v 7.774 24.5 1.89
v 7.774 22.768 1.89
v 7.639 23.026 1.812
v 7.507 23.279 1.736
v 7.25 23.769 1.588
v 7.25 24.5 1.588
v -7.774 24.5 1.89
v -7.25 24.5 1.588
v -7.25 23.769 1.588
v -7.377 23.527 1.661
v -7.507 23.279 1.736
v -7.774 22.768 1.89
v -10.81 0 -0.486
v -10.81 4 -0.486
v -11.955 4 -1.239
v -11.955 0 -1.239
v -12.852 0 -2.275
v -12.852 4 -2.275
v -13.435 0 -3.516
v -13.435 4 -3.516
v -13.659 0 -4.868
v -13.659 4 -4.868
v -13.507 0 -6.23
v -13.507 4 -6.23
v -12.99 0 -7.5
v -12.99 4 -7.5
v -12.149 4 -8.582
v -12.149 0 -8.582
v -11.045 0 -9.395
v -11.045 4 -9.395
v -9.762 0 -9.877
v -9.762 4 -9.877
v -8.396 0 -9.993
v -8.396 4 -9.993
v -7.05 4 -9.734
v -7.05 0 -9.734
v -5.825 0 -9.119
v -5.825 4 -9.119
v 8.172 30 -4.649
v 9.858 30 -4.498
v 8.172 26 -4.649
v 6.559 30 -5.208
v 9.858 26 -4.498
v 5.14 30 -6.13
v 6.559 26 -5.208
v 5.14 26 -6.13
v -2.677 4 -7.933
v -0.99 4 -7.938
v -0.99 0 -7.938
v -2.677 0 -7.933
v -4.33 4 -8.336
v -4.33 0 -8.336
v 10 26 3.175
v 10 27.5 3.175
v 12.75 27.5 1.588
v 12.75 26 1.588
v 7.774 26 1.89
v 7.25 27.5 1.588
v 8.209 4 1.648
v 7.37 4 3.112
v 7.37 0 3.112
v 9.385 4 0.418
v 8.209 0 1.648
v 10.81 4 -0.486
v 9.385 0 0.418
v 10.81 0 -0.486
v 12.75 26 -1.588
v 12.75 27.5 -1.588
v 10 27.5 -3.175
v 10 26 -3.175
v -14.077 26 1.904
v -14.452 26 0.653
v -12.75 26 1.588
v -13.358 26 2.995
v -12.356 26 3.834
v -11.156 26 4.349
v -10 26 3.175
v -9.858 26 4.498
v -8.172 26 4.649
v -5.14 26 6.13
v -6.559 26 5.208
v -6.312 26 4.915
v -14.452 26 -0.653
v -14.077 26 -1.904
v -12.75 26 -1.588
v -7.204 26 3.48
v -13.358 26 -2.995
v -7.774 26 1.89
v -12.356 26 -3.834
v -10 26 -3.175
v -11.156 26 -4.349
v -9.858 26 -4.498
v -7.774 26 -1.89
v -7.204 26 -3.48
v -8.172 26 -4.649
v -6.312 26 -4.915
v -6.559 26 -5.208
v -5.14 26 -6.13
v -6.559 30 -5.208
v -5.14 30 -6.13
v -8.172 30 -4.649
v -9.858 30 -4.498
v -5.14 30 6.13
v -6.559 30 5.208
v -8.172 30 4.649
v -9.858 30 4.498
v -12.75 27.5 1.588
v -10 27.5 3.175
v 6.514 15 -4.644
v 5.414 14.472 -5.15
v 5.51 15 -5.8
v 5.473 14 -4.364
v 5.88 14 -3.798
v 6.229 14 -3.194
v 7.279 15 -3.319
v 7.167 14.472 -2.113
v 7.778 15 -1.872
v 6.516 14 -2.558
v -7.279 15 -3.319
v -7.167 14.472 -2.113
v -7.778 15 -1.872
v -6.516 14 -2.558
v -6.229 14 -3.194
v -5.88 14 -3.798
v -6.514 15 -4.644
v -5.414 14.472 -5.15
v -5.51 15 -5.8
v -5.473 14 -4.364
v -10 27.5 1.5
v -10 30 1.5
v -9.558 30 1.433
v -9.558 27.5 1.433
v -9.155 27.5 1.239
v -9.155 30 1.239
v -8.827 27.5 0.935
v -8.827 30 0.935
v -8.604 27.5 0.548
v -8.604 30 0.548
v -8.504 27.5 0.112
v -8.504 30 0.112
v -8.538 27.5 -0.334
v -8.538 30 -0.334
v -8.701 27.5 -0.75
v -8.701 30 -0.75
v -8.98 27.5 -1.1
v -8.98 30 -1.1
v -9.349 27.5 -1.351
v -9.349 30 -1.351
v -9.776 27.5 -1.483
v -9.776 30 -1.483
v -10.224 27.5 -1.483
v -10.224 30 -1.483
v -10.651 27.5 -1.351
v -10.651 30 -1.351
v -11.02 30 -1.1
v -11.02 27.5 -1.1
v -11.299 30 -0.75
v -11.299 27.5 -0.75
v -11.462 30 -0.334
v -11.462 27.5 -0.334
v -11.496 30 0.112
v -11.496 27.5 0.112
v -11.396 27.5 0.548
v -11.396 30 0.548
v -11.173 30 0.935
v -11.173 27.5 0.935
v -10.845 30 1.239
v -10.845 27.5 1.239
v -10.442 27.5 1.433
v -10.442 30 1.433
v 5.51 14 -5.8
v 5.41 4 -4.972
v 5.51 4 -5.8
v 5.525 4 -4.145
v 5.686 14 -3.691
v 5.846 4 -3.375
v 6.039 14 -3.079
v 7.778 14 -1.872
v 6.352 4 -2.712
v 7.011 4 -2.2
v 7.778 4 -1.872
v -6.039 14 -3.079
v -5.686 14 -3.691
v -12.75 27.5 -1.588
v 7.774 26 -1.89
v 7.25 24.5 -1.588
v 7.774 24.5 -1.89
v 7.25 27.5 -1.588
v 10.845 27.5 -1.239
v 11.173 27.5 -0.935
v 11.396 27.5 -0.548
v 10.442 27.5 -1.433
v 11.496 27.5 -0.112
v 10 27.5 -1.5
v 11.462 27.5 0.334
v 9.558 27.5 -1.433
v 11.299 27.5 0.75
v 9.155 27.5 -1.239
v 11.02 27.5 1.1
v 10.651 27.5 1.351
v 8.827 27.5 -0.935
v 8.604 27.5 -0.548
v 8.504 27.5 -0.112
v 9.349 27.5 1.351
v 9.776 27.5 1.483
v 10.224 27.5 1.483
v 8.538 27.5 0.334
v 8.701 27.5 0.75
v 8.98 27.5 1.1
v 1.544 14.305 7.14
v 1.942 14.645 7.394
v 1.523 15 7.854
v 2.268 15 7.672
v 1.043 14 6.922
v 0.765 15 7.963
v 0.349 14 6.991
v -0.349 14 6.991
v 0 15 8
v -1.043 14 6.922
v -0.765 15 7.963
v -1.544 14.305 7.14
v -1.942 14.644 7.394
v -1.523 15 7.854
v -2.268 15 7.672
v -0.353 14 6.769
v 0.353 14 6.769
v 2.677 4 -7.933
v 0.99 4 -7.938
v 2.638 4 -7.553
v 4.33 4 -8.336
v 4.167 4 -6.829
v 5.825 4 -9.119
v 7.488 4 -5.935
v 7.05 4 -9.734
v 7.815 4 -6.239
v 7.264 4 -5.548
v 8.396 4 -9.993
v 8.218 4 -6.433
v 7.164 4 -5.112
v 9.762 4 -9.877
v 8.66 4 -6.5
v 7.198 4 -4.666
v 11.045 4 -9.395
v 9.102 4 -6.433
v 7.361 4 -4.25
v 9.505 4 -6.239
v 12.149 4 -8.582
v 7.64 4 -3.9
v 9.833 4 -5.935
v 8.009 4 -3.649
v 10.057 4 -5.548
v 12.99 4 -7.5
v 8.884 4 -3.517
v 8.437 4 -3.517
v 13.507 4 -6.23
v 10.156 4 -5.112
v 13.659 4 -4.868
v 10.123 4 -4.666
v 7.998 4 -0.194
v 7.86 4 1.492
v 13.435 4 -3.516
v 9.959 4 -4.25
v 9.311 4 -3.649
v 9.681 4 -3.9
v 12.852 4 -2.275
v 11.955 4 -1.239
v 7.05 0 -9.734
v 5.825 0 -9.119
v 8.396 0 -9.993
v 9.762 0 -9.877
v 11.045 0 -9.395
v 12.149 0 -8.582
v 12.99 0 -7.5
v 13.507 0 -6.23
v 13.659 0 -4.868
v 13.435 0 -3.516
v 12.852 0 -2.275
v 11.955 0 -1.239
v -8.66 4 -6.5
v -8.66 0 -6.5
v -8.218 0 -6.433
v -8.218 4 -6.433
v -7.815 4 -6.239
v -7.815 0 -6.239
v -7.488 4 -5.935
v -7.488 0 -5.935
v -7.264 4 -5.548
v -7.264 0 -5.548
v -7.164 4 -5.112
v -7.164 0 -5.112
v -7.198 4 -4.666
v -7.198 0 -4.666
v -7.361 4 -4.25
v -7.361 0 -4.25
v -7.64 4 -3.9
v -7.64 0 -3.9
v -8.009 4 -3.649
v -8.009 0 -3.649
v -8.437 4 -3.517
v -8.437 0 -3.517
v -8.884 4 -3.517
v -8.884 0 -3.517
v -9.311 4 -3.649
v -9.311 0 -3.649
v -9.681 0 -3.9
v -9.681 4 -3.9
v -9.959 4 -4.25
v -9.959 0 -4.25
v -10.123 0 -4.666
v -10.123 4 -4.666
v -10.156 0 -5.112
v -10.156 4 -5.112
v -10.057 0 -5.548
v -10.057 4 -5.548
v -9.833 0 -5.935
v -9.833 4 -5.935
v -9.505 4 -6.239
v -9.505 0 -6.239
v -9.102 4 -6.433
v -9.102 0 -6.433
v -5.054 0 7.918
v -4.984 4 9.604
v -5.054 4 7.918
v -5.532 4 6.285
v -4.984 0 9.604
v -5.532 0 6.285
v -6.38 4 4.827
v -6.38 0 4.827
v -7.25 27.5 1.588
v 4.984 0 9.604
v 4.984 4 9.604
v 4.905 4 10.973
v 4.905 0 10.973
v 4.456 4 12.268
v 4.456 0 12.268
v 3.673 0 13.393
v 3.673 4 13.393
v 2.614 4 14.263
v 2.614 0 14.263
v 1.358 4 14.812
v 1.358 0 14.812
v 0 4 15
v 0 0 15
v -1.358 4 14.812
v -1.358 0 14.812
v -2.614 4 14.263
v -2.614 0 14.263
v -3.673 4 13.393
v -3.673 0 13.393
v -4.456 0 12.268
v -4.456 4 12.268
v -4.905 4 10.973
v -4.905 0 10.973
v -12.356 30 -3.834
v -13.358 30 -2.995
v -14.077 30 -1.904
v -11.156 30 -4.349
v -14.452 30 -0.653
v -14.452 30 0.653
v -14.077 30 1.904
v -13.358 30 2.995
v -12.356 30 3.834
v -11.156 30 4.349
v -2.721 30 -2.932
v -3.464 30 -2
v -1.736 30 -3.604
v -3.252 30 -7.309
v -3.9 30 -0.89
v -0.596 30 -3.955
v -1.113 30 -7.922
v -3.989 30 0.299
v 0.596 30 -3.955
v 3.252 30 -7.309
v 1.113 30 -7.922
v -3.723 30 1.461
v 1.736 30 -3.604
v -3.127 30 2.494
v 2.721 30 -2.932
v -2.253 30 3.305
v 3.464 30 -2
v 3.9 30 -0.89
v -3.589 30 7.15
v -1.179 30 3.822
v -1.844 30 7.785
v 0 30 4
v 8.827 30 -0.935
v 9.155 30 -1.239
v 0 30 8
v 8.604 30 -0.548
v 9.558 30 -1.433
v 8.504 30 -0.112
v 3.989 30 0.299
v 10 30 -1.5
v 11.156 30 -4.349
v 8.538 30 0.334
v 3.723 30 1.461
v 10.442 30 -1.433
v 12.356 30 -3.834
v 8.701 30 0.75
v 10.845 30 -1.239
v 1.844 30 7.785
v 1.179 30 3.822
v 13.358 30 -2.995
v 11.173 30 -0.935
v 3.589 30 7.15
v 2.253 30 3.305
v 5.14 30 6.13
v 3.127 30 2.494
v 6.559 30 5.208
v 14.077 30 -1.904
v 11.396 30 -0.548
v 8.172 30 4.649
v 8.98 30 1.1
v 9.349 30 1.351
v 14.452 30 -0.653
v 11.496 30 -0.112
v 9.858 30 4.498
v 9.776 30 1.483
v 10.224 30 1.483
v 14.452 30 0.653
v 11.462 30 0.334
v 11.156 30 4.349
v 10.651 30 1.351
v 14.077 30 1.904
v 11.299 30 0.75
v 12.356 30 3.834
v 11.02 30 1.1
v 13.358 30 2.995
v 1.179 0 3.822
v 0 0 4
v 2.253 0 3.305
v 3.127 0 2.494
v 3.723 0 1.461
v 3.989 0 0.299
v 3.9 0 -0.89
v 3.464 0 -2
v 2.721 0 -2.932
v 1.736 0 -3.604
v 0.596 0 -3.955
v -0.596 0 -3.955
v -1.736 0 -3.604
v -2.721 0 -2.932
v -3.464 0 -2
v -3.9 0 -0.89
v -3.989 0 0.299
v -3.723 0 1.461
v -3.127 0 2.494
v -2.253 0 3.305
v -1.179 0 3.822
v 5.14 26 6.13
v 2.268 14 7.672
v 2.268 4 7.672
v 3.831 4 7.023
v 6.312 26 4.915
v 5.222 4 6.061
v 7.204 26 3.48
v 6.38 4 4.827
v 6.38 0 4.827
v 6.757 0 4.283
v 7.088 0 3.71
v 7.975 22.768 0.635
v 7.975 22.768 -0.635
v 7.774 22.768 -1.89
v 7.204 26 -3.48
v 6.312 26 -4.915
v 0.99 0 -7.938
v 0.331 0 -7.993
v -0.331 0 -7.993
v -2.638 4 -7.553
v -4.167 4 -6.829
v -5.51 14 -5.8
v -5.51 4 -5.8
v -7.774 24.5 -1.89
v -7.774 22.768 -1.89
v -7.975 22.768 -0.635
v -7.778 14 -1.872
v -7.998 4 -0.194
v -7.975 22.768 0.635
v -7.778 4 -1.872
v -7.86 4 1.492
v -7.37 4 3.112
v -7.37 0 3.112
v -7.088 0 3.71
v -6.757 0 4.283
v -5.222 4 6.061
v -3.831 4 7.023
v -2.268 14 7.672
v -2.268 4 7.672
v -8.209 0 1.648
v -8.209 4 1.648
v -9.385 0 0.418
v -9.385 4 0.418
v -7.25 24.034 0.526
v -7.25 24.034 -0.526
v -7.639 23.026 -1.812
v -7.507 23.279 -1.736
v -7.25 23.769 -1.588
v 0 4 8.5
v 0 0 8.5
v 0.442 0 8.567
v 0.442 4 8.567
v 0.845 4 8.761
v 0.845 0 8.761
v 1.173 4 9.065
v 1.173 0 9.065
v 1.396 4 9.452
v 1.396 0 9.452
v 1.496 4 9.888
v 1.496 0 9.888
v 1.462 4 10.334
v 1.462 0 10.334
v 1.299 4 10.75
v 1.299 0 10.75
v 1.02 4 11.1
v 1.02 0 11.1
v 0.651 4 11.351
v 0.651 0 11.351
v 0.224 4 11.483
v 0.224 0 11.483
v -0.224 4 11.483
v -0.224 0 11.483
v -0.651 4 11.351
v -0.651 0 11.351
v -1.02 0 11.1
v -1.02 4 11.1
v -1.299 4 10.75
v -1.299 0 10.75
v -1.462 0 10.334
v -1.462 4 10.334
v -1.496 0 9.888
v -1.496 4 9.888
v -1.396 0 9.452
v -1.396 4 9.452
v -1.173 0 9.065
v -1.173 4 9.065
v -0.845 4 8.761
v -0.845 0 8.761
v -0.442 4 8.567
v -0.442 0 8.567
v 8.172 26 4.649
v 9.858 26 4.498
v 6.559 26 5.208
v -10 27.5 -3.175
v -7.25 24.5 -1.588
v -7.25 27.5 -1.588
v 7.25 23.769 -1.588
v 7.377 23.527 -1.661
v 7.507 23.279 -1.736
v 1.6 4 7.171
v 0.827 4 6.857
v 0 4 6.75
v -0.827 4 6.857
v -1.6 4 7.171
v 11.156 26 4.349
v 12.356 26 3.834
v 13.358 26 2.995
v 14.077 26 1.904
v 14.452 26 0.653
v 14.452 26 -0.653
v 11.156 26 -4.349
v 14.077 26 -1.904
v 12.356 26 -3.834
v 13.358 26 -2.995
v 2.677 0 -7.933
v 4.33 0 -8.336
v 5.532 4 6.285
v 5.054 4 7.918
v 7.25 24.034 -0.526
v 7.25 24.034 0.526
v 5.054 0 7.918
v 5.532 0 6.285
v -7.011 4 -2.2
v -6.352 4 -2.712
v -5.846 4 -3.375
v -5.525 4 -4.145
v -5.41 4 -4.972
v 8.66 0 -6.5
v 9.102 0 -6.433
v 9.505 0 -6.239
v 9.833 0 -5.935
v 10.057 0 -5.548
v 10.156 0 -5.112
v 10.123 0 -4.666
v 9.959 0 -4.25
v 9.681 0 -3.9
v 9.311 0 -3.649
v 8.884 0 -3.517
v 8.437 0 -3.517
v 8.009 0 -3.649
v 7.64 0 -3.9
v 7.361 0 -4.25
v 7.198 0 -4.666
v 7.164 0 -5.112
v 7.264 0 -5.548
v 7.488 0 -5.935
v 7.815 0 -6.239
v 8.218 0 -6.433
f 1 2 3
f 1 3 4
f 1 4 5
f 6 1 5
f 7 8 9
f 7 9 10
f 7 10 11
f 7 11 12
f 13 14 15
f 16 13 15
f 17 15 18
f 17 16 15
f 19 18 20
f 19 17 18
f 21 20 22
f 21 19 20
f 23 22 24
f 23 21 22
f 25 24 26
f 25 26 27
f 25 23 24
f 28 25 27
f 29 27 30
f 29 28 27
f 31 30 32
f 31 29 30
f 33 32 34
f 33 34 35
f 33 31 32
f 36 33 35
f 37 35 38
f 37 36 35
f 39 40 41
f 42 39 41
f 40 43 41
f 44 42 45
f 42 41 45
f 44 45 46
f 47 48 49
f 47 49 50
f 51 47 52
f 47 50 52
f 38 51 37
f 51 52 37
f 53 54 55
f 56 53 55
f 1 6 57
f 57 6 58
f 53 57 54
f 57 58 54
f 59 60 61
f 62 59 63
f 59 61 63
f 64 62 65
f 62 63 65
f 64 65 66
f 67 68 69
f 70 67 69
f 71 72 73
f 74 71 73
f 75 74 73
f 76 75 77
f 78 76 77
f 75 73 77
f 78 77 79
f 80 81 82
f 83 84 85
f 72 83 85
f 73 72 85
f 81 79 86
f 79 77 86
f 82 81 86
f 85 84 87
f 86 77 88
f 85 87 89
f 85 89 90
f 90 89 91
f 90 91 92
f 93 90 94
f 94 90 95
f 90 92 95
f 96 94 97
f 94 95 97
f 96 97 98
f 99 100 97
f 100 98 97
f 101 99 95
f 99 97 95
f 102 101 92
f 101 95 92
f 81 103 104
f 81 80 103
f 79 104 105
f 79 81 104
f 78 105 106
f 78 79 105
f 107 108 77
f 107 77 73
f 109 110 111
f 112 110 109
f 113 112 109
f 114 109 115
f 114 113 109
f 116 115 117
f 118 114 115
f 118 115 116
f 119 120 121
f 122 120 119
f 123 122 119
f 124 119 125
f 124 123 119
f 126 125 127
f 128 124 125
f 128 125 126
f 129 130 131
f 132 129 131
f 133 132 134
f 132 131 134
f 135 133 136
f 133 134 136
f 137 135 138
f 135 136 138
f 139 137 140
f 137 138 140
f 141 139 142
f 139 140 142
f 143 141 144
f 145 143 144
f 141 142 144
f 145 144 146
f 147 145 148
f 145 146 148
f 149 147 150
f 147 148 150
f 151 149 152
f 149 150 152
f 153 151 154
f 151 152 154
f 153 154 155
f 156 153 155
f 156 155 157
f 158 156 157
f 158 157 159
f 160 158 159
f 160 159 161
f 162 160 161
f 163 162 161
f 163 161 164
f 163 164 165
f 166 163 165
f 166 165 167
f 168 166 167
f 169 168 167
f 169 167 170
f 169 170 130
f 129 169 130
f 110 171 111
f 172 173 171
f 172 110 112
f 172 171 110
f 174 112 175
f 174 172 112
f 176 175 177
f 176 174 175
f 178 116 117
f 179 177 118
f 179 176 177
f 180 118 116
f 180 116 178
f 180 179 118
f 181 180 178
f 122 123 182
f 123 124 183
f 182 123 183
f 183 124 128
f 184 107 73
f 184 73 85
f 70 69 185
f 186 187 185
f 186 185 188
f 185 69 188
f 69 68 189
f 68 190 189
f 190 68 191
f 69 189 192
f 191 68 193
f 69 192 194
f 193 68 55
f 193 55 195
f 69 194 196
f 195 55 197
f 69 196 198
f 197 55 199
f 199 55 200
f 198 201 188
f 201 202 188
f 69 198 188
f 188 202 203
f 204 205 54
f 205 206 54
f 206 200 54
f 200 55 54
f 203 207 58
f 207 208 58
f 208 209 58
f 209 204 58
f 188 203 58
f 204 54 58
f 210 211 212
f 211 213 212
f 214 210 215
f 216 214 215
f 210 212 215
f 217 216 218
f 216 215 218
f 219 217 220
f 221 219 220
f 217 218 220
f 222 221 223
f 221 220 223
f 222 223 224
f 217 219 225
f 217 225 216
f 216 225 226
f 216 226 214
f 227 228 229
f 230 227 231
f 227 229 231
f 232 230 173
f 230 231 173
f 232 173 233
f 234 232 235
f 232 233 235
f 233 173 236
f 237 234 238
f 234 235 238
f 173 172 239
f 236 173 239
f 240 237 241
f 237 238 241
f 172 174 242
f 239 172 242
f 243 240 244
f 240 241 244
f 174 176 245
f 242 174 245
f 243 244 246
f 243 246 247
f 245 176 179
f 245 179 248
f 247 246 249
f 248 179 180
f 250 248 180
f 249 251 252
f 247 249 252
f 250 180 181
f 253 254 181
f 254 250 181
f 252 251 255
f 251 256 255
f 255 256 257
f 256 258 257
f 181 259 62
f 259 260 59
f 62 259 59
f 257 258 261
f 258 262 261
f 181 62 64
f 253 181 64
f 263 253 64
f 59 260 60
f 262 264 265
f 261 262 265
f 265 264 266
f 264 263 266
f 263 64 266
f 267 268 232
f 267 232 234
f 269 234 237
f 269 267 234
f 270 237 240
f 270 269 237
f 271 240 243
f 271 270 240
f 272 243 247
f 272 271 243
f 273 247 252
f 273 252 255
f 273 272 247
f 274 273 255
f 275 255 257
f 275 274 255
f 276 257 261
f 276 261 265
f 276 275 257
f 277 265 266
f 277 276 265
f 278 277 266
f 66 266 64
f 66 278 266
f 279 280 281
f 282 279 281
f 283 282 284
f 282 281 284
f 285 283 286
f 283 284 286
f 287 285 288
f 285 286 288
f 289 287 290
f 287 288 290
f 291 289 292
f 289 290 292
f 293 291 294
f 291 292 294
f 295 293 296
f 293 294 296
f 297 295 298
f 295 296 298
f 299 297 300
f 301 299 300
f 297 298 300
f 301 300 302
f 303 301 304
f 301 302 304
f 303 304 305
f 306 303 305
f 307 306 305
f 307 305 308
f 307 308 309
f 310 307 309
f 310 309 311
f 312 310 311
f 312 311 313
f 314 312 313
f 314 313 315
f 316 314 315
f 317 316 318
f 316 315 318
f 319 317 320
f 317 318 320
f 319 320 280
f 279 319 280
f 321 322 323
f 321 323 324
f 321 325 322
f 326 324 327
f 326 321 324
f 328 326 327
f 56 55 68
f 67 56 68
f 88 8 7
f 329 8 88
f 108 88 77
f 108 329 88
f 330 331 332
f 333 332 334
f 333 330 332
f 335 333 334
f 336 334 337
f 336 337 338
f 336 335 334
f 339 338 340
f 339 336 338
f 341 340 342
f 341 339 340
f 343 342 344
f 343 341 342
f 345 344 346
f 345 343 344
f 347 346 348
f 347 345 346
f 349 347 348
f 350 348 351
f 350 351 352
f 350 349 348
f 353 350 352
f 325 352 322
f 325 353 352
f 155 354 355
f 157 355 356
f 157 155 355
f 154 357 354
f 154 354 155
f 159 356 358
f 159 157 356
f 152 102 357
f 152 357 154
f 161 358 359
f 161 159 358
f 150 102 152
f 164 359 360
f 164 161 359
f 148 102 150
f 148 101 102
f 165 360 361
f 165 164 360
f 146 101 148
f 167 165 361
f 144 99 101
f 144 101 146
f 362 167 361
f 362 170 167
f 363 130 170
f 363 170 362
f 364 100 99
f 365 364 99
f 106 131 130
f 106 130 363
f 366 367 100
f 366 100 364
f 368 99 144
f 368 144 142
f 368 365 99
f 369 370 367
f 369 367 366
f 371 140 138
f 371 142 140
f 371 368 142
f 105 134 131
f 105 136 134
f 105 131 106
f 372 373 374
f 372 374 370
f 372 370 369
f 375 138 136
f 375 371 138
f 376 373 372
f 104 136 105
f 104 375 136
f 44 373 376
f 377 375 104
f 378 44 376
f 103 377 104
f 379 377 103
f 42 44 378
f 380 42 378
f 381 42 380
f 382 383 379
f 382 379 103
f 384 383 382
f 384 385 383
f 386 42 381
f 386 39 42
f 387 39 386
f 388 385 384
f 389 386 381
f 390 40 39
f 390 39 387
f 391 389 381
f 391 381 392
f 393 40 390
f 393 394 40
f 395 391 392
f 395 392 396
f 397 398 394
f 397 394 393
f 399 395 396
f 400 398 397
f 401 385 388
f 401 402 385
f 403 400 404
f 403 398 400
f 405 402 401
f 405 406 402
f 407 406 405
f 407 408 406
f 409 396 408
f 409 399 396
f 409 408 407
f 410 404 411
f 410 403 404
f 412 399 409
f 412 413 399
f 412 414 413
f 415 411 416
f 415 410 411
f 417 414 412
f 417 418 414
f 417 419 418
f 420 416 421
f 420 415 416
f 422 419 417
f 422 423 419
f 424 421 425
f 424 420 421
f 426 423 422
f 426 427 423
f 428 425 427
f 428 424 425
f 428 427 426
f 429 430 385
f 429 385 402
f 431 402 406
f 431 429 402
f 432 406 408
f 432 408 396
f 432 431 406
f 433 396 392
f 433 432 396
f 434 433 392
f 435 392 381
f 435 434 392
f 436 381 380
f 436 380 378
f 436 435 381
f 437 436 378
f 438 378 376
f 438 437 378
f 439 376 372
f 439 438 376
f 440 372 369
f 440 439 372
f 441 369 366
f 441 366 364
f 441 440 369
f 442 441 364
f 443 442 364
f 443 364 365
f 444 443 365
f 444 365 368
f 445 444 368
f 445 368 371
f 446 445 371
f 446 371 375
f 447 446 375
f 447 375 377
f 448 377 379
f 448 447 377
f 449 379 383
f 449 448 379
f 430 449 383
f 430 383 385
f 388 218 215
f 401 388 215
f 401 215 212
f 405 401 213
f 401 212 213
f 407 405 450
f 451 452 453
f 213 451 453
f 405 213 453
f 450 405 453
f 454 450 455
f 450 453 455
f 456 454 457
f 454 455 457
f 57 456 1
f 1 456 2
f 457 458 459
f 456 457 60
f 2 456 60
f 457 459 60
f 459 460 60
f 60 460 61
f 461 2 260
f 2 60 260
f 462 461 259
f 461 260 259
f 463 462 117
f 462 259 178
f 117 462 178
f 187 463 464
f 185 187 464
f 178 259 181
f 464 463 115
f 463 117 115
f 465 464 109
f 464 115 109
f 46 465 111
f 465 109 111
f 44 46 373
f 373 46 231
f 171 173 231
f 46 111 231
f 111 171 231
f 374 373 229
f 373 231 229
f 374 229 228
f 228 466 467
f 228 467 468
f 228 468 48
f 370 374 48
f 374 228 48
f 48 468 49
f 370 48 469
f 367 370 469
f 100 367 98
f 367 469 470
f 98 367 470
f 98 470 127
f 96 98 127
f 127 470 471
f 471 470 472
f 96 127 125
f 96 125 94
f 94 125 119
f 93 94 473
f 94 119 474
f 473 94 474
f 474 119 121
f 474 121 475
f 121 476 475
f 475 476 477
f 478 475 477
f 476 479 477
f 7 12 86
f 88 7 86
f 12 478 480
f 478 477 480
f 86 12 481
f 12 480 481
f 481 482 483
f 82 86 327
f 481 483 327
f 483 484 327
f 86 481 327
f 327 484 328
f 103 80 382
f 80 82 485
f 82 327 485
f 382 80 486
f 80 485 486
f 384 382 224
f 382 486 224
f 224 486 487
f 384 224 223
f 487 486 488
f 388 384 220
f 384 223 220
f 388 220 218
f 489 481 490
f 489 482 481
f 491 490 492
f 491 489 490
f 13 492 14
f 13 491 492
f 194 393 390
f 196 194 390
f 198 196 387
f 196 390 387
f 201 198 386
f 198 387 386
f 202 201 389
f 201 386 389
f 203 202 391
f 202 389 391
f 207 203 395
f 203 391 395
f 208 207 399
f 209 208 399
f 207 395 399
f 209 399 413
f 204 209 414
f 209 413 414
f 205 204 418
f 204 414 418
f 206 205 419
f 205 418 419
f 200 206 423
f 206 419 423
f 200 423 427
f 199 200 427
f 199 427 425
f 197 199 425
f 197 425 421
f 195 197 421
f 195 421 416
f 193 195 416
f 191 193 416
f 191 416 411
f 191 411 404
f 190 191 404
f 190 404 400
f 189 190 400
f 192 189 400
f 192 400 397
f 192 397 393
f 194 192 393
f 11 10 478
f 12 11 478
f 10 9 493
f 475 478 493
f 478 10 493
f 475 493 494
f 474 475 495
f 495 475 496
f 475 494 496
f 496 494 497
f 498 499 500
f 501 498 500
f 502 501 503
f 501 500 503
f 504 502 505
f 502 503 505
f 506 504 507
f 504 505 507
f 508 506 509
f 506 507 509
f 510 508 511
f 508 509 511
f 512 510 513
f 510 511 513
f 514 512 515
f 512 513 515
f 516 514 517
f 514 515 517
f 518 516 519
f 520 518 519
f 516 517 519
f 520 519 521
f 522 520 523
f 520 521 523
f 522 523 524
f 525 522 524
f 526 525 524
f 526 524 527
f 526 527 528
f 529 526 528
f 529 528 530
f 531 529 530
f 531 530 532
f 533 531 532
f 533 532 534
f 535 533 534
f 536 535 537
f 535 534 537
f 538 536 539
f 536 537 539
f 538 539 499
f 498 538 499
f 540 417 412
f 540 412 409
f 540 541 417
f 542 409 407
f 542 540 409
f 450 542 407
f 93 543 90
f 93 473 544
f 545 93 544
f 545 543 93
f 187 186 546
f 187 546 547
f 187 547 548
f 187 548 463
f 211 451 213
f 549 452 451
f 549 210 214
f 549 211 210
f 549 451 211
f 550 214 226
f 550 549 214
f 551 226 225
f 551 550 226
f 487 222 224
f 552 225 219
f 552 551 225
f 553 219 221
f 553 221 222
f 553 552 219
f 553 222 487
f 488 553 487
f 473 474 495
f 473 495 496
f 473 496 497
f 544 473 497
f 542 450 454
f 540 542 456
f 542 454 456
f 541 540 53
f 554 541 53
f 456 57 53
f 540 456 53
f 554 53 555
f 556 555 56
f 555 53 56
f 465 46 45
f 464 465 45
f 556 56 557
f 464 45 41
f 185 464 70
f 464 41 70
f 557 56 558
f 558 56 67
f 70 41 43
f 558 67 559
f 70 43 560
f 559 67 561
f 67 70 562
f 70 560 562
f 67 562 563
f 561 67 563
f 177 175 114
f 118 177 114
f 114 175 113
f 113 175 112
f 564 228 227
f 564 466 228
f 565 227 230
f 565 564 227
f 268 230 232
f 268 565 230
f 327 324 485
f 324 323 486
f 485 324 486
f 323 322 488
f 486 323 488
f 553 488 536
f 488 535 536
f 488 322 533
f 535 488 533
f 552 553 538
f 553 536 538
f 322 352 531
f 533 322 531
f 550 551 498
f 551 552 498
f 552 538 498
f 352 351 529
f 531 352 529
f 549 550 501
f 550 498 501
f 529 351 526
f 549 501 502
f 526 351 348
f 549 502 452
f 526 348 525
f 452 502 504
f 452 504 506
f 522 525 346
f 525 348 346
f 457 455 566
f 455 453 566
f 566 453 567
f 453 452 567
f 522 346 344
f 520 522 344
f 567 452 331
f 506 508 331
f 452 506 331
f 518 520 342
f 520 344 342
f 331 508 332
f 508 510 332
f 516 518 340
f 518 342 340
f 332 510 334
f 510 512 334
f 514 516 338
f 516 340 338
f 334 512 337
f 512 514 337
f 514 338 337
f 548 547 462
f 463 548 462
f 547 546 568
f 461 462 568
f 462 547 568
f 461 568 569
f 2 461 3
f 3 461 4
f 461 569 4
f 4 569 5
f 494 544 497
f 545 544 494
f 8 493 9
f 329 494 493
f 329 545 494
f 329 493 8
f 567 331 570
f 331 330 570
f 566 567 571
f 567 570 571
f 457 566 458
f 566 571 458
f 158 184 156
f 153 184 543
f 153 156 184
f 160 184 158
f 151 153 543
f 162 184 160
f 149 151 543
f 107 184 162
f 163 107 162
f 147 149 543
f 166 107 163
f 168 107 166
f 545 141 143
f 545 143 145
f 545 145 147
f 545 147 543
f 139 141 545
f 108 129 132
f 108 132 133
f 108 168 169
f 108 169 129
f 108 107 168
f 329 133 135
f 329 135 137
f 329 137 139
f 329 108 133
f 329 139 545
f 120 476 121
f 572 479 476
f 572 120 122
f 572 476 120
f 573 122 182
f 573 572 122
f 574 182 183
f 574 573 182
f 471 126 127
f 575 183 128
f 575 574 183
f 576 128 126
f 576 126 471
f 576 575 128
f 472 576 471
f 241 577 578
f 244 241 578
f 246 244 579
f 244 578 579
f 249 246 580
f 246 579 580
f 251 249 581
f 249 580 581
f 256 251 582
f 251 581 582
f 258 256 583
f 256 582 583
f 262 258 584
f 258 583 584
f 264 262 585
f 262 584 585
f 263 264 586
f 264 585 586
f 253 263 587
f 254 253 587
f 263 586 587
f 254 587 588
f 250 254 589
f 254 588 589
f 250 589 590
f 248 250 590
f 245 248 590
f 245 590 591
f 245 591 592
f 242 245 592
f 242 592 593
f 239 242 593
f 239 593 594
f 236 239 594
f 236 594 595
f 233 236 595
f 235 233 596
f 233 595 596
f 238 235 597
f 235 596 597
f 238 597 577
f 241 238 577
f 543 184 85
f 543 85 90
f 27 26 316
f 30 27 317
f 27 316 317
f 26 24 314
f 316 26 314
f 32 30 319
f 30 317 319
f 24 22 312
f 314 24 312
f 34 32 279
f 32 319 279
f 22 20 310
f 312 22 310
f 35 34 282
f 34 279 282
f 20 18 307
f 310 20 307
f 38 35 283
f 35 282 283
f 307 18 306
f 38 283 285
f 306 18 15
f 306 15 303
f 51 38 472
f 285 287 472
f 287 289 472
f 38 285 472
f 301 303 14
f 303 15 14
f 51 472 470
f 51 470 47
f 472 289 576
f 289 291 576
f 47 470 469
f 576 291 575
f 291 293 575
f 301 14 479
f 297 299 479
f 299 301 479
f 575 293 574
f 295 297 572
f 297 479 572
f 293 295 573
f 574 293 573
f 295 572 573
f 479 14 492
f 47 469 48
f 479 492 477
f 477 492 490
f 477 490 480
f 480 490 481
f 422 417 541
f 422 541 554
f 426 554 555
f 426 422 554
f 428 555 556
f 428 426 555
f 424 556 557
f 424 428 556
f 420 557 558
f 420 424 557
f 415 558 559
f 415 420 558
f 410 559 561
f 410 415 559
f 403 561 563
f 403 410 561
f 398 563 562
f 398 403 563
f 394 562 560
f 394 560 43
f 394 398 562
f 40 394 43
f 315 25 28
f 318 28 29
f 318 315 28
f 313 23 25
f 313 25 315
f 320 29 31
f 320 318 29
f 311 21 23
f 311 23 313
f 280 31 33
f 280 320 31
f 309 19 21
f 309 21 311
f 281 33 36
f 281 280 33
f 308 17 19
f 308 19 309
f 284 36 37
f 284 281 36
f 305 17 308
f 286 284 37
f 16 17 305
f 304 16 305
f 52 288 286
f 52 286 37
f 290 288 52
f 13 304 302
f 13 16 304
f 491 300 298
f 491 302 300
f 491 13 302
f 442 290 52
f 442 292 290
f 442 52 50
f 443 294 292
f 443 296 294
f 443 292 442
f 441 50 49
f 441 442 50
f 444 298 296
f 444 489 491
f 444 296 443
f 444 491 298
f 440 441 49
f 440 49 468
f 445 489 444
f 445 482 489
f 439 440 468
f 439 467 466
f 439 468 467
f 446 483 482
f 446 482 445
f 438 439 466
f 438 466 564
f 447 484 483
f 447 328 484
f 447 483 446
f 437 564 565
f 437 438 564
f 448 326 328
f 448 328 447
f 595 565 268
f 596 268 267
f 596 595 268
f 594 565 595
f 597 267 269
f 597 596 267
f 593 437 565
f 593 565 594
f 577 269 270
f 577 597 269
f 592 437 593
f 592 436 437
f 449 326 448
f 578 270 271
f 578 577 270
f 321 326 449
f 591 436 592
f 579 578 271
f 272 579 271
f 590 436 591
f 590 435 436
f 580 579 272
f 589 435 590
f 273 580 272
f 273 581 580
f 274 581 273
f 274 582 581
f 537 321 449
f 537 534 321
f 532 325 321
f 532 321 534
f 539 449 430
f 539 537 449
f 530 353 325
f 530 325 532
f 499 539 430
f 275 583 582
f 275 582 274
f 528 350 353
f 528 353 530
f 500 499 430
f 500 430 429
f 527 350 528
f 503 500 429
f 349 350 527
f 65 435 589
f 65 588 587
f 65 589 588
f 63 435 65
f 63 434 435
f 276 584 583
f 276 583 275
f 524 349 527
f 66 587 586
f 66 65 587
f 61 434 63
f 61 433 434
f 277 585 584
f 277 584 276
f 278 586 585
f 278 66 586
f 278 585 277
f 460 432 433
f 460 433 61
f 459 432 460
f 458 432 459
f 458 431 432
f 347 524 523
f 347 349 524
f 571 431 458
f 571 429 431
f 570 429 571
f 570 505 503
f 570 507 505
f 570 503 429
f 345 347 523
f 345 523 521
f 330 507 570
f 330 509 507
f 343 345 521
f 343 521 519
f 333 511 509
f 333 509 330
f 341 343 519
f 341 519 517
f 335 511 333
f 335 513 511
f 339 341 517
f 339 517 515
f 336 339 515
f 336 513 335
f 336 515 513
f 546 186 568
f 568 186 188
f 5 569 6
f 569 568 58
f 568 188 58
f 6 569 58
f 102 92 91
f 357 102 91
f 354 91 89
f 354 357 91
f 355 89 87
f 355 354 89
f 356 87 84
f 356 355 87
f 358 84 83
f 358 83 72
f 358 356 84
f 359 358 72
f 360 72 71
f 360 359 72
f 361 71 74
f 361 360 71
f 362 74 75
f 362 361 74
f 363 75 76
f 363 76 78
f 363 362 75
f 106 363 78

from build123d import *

# Parameters (mm, degrees)
SKETCH1_R               = 8
SKETCH1_R_2             = 4
BOSS_EXTRUDE1_DEPTH     = 30
SKETCH2_R               = 4.5
SKETCH2_R_2             = 1.5
BOSS_EXTRUDE2_DEPTH     = 4
FILLET1_R               = 7
SKETCH3_R               = 5
SKETCH3_R_2             = 1.5
BOSS_EXTRUDE3_DEPTH     = 4
FILLET2_R               = 7
SKETCH4_R               = 3.25
CUT_EXTRUDE1_DEPTH      = 10
CHAMFER1_SIZE           = 1
CUT_EXTRUDE2_DEPTH      = 1.5
CUT_EXTRUDE2_DEPTH_BACK = 1.5
CHAMFER2_SIZE           = 1.732050808
CHAMFER2_SIZE_2         = 1
CHAMFER3_SIZE           = 1.732050808
CHAMFER3_SIZE_2         = 1


with BuildPart() as part:
    # Sketch1 → Boss-Extrude1 (new body)
    with BuildSketch(Plane(origin=(0, 0, 0), x_dir=(1, 0, 0), z_dir=(0, 1, 0))):
        with Locations(Location((0, 0, 0), (0, 0, 270))):
            Circle(SKETCH1_R)
        with Locations(Location((0, 0, 0), (0, 0, 270))):
            Circle(SKETCH1_R_2, mode=Mode.SUBTRACT)
    extrude(amount=BOSS_EXTRUDE1_DEPTH)

    # Sketch2 → Boss-Extrude2 (add)
    # profile 1 of 2: a face of its own
    with BuildSketch(Plane(origin=(0, 30, 0), x_dir=(1, 0, 0), z_dir=(0, 1, 0))):
        with Locations((-10, 0)):
            Circle(SKETCH2_R)
        with Locations(Location((-10, 0, 0), (0, 0, 270))):
            Circle(SKETCH2_R_2, mode=Mode.SUBTRACT)
    # profile 2 of 2: a face of its own
    with BuildSketch(Plane(origin=(0, 30, 0), x_dir=(1, 0, 0), z_dir=(0, 1, 0))):
        with Locations((10, 0)):
            Circle(SKETCH2_R)
        with Locations(Location((10, 0, 0), (0, 0, 90))):
            Circle(SKETCH2_R_2, mode=Mode.SUBTRACT)
    extrude(amount=-BOSS_EXTRUDE2_DEPTH)

    # Fillet1
    fillet1_edges = [part.edges().sort_by_distance(p)[0] for p in [
        (-7.1875, 28, 3.512811374),
        (-7.1875, 28, -3.512811374),
        (7.1875, 28, -3.512811374),
        (7.1875, 28, 3.512811374),
    ]]
    fillet(fillet1_edges, radius=FILLET1_R)

    # Sketch3 → Boss-Extrude3 (add)
    # profile 1 of 3: a face of its own
    with BuildSketch(Plane.XZ):
        with Locations((0, 10)):
            Circle(SKETCH3_R)
        with Locations(Location((0, 10, 0), (0, 0, 270))):
            Circle(SKETCH3_R_2, mode=Mode.SUBTRACT)
    # profile 2 of 3: a face of its own
    with BuildSketch(Plane.XZ):
        with Locations((8.660254038, -5)):
            Circle(SKETCH3_R)
        with Locations(Location((8.660254038, -5, 0), (0, 0, 270))):
            Circle(SKETCH3_R_2, mode=Mode.SUBTRACT)
    # profile 3 of 3: a face of its own
    with BuildSketch(Plane.XZ):
        with Locations((-8.660254038, -5)):
            Circle(SKETCH3_R)
        with Locations(Location((-8.660254038, -5, 0), (0, 0, 270))):
            Circle(SKETCH3_R_2, mode=Mode.SUBTRACT)
    extrude(amount=-BOSS_EXTRUDE3_DEPTH)

    # Fillet2
    fillet2_edges = [part.edges().sort_by_distance(p)[0] for p in [
        (3.962007067, 2, 6.95),
        (-3.962007067, 2, 6.95),
        (4.037873023, 2, -6.90619877),
        (7.99988009, 2, -0.04380123),
        (-7.99988009, 2, -0.04380123),
        (-4.037873023, 2, -6.90619877),
    ]]
    fillet(fillet2_edges, radius=FILLET2_R)

    # Sketch4 → Cut-Extrude1 (cut)
    with BuildSketch(Plane(origin=(0, 4, 0), x_dir=(1, 0, 0), z_dir=(0, 1, 0))):
        with Locations((8.660254038, 5)):
            Circle(SKETCH4_R)
        with Locations((0, -10)):
            Circle(SKETCH4_R)
        with Locations((-8.660254038, 5)):
            Circle(SKETCH4_R)
    extrude(amount=CUT_EXTRUDE1_DEPTH, mode=Mode.SUBTRACT)

    # Chamfer1
    chamfer1_edges = [part.edges().sort_by_distance(p)[0] for p in [
        (-6.92820323, 14, -4),
        (1.145643924, 14, 7.917543811),
        (6.92820323, 14, -4),
    ]]
    chamfer(chamfer1_edges, length=CHAMFER1_SIZE)

    # Sketch5 → Cut-Extrude2 (cut, two sides: drawn at the far end of the back side and taken through both)
    with BuildSketch(Plane.XZ.offset(-26).offset(-CUT_EXTRUDE2_DEPTH_BACK)):
        Polygon((-10, 3.175426481), (-12.75, 1.58771324), (-12.75, -1.58771324), (-10, -3.175426481), (-7.25, -1.58771324), (-7.25, 1.58771324), align=None)
        Polygon((7.25, 1.58771324), (10, 3.175426481), (12.75, 1.58771324), (12.75, -1.58771324), (10, -3.175426481), (7.25, -1.58771324), align=None)
    extrude(amount=CUT_EXTRUDE2_DEPTH + CUT_EXTRUDE2_DEPTH_BACK, mode=Mode.SUBTRACT)

    # Chamfer2
    # the kernel refuses this chamfer: 1.732050808, 1 mm, written as the material it takes off along each edge
    with BuildSketch(Plane(origin=(0, 24.5, 0), x_dir=(-0.6976791075699221, 0, 0.7164104011392053), z_dir=(0.7164104011392053, 0, 0.6976791075699221))) as chamfer2_piece_1_section:
        Polygon((8, CHAMFER2_SIZE), (8 - CHAMFER2_SIZE_2, 0), (8, 0), align=None)
    chamfer2_piece_1 = revolve(axis=Axis((0, 24.5, 0), (0, -1, 0)), revolution_arc=91.517812411, mode=Mode.PRIVATE)
    chamfer2_piece_1 = split(chamfer2_piece_1, bisect_by=Plane(origin=(-6.887741649, 23.854160996, 1.378563284), z_dir=(-0.5000000000000001, 0, -0.8660254037844386)), keep=Keep.TOP, mode=Mode.PRIVATE)
    chamfer2_piece_1 = split(chamfer2_piece_1, bisect_by=Plane(origin=(-7.25, 23.854160996, 0), z_dir=(-1, 0, 0)), keep=Keep.TOP, mode=Mode.PRIVATE)
    chamfer2_piece_1 = split(chamfer2_piece_1, bisect_by=Plane(origin=(-6.887741649, 23.854160996, -1.378563284), z_dir=(-0.49999999999999994, 0, 0.8660254037844389)), keep=Keep.TOP, mode=Mode.PRIVATE)
    add(chamfer2_piece_1, mode=Mode.SUBTRACT)

    # Chamfer3
    # the kernel refuses this chamfer: 1.732050808, 1 mm, written as the material it takes off along each edge
    with BuildSketch(Plane(origin=(0, 24.5, 0), x_dir=(0.6976791075699224, 0, -0.7164104011392051), z_dir=(-0.7164104011392051, 0, -0.6976791075699224))) as chamfer3_piece_1_section:
        Polygon((8, CHAMFER3_SIZE), (8 - CHAMFER3_SIZE_2, 0), (8, 0), align=None)
    chamfer3_piece_1 = revolve(axis=Axis((0, 24.5, 0), (0, -1, 0)), revolution_arc=91.517812411, mode=Mode.PRIVATE)
    chamfer3_piece_1 = split(chamfer3_piece_1, bisect_by=Plane(origin=(6.887741649, 23.854160996, -1.378563284), z_dir=(0.49999999999999994, 0, 0.8660254037844389)), keep=Keep.TOP, mode=Mode.PRIVATE)
    chamfer3_piece_1 = split(chamfer3_piece_1, bisect_by=Plane(origin=(7.25, 23.854160996, 0), z_dir=(1, 0, 0)), keep=Keep.TOP, mode=Mode.PRIVATE)
    chamfer3_piece_1 = split(chamfer3_piece_1, bisect_by=Plane(origin=(6.887741649, 23.854160996, 1.378563284), z_dir=(0.5000000000000001, 0, -0.8660254037844386)), keep=Keep.TOP, mode=Mode.PRIVATE)
    add(chamfer3_piece_1, mode=Mode.SUBTRACT)


solid = part.part
